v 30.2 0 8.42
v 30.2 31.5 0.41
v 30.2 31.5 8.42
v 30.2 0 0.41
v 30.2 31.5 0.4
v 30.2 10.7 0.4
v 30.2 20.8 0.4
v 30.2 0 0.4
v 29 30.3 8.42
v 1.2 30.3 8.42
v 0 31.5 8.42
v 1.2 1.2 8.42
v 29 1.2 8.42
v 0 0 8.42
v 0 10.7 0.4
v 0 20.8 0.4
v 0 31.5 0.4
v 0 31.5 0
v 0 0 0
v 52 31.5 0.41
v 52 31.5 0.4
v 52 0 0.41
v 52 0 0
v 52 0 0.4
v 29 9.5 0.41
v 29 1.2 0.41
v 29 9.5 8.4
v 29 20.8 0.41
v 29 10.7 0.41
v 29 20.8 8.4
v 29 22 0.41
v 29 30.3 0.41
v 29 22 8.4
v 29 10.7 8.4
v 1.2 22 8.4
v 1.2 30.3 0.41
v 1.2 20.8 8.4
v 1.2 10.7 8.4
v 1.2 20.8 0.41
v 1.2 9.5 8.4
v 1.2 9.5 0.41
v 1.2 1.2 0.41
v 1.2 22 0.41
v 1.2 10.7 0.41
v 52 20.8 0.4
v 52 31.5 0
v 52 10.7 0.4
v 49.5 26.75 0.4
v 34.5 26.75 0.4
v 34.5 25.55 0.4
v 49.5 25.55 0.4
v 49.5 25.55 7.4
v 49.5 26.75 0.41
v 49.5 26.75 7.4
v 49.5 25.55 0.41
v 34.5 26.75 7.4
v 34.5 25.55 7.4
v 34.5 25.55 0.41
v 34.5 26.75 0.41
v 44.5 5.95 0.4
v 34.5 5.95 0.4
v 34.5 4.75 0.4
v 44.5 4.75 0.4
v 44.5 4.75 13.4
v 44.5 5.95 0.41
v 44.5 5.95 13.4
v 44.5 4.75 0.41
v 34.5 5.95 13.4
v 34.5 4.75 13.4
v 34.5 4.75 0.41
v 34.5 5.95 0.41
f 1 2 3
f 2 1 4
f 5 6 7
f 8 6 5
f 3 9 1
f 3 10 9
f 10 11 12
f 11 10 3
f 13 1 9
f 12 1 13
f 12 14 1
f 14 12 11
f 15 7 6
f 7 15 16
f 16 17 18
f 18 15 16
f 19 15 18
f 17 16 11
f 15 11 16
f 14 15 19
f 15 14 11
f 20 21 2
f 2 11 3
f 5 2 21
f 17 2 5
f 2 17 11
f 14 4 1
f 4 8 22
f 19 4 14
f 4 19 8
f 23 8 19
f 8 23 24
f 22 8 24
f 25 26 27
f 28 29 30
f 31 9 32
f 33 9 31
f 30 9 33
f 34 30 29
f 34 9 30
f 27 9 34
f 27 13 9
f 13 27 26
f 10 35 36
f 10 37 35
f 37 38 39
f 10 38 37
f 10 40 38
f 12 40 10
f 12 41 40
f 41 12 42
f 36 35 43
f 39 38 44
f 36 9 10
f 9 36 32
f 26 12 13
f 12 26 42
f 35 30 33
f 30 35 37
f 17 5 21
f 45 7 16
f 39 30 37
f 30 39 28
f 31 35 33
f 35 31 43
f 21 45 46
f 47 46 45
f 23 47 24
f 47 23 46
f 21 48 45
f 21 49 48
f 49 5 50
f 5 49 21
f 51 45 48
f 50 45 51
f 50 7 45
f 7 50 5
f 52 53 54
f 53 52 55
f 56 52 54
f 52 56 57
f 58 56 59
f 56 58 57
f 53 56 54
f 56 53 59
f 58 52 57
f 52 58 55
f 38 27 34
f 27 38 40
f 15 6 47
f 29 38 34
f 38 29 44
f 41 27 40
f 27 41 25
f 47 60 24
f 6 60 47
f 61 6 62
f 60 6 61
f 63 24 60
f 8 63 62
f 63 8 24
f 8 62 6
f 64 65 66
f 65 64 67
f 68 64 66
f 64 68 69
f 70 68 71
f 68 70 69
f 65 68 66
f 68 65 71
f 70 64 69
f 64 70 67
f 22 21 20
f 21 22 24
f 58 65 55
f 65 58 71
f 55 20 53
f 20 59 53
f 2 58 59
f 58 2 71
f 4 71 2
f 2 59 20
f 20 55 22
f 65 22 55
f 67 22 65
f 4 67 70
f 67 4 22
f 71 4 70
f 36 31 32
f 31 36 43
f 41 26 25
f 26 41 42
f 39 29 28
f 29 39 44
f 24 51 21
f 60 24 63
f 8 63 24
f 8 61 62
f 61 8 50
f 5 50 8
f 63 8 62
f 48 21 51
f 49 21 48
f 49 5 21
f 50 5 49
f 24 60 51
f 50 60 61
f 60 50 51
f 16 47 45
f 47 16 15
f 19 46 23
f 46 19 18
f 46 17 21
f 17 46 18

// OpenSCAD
// file: ../../Base/Boxes.scad
// Fischertechnik Box Foundation
// Pre-designed Boxes

use <Constants.scad>

include <PlacementOptions.scad>

box190Width = 190;
box190Depth = 130;
box130Width = 130;
box130Depth = 95;
boxUsageHeight = 33.9;
boxWallThickness = 2.4;
boxBaseThickness = 1.0;
boxWebWidth = 3.0;

// getBoxWallThickness()
// Gets the wall thickness of a Fischertechnik Box

function getBoxWallThickness() = boxWallThickness;

// Gets the usable height of a fischertechnik box
function getBoxUsageHeight() = boxUsageHeight;

// Gets the thickness of the Fischertechnik box base.
function getBoxBaseThickness() = boxBaseThickness;

// Gets the width of a box web
function getBoxWebWidth() = boxWebWidth;

// Gets the usable inner space of a Box 190 as an x/y-list
function getBox190Space() = [
    box190Width - 2*getBoxWallThickness(), 
    box190Depth - 2*getBoxWallThickness() ];

// Imports the Fischertechnik empty box 130x190 mm and places it at position 0,0
// 190x130 are the outer sizes, the inner space is slightly smaller. Use getBox190Space() to get the inner sizes.
// This module needs the STL file "Fischertechnik Box 130x190.stl" in the library path.
// The box is positioned that the usable inner space is at the 0,0,0 position. The

module Box190() {
    translate([-getBoxWallThickness(),-getBoxWallThickness(),-getBoxBaseThickness()])
        import("Fischertechnik Box 130x190.stl", convexity=3);
}

// Gets the usable inner space of a Box 130 as an x/y-list
function getBox130Space() = [
    box130Width - 2*getBoxWallThickness(), 
    box130Depth - 2*getBoxWallThickness() ];

// Imports the Fischertechnik empty box 95x130 mm and places it at position 0,0
// 190x130 are the outer sizes, the inner space is slightly smaller. Use getBox190Space() to get the inner sizes.
// This module needs the STL file "Fischertechnik Box 95x130.stl" in the library path.
// The box is positioned that the usable inner space is at the 0,0,0 position. The

module Box130() {
    translate([-getBoxWallThickness(),-getBoxWallThickness(),-getBoxBaseThickness()])
        import("Fischertechnik Box 95x130.stl", convexity=3);
}

// Creates a web at the specified box walls
// corner 0 = LowerLeft, 1 = UpperLeft, 2 = UpperRight, 3 = LowerRight
// side 0 = LeftOfCorner, 1 = RightOfCorner
// distance = Distance in mm from the corner
// box = inner width and depth of the box (default: Box 190)
// webWidth = length of the web (default is 3 mms)
// webThickness = thickness of the web (default is 1 mm)

module BoxWeb(corner, side, distance, box=getBox190Space(), webWidth=getBoxWebWidth(), webThickness=1.0) {
    sink = getBoxWallThickness()/2;

    width = (corner % 2 == 0) ? 
            (side == LeftOfCorner ? webWidth : webThickness) :
            (side == LeftOfCorner ? webThickness : webWidth);

    depth = (corner % 2 == 0) ? 
            (side == RightOfCorner ? webWidth : webThickness) :
            (side == RightOfCorner ? webThickness : webWidth);
    
    xDiff = corner == LowerLeft ? 
                (side == LeftOfCorner ? -sink : distance) :
            (corner == UpperLeft ?                
                (side == LeftOfCorner ? distance : -sink) :
            (corner == UpperRight ?
                (side == LeftOfCorner ? box.x-webWidth+sink : box.x-distance-webThickness) :
                (side == LeftOfCorner ? box.x-distance-webThickness: box.x-webWidth+sink)));

    yDiff = corner == LowerLeft ? 
                (side == RightOfCorner ? -sink : distance) :
            (corner == UpperLeft ?
                (side == RightOfCorner ? box.y-distance : box.y-webWidth+sink) :
            (corner == UpperRight ?
                (side == RightOfCorner ? box.y-webWidth+sink : box.y-distance) :
                (side == RightOfCorner ? distance : -sink)));
    
    translate([xDiff, yDiff, -getExcess()])
        cube([width, depth, boxUsageHeight + 2*getExcess()]);
}
// file: ../../Base/Alignment.scad
// Fischertechnik Box Foundation
// Geometry Helpers Alignment

include <PlacementOptions.scad>

// getAlignedX(elementWidth, spaceWidth, align=AlignRight, offset=0)
// Gets the aligned X offset of an element with the given
// width in the given space.
// elementWidth = The width of the element to positon
// spaceWidth = The space where the element should be aligned
// align = 0 AlignLeft, 1 AlignCenter, 2 AlignRight
// offset = an optional offset from the aligned position. When
// aligned left or centered, then positive values are in X direction.
// When aligned right then positive values are in negative X direction.

function getAlignedX(elementWidth, spaceWidth, align=AlignRight, offset=0) =
    (align == AlignLeft) ?
        offset :
        ((align == AlignCenter) ?
        (spaceWidth - elementWidth)/2 + offset :
        spaceWidth - offset - elementWidth);

// getAlignedY(elementDepth, spaceDepth, align=AlignTop, offset=0)
// Gets the aligned Y offset of an element with the given
// depth in the given space.
// elementDepth = The depth of the element to positon
// spaceDepth = The space where the element should be aligned
// align = 0 AlignBottom, 1 AlignCenter, 2 AlignTop
// offset = an optional offset from the aligned position. When
// aligned bottom or centered, then positive values are in Y direction.
// When aligned top then positive values are in negative Y direction.

function getAlignedY(elementDepth, spaceDepth, align=AlignTop, offset=0) =
    (align == AlignBottom) ?
        offset :
        ((align == AlignCenter) ?
        (spaceDepth - elementDepth)/2 + offset :
        spaceDepth - offset - elementDepth);
// file: ../../Base/Rotation.scad
// Fischertechnik Box Foundation
// Geometry Helpers Rotation

include <PlacementOptions.scad>

// getRotatedSpace(space, rotation=NoRotation)
// Rotates the space dependent on the specified rotation

function getRotatedSpace(space, rotation=NoRotation) = [
    (rotation == Rotate90 || rotation == Rotate270) ? space.y : space.x,
    (rotation == Rotate90 || rotation == Rotate270) ? space.x : space.y
];

// Rotates the given space around the fixed left lower corner
// space = the space the children needs as width/depth list [width,depth]
// rotation = 0 Rotate0 degrees, 1 Rotate90 degrees, 2 Rotate180 degrees, 3 Rotate270 degrees (equivalent to -90)

module RotateFix(space, rotation=Rotate0) {
    dy = (rotation == Rotate0 || rotation == Rotate270) ? 0 :
        (rotation == Rotate90) ? space.x :
        space.y;
    dx = (rotation < Rotate180) ? 0 :
        (rotation == Rotate180) ? space.x :
        space.y;
    
    translate([dx, dy, 0])
        rotate([0, 0, rotations[rotation]])
            children();
}
// file: ../../Base/Placement.scad
// Fischertechnik Box Foundation
// Geometry Helpers Placement

use <Constants.scad>
use <Alignment.scad>
use <Rotation.scad>
use <Boxes.scad>

include <PlacementOptions.scad>

// Place(x=0, y=0, elementSpace=[0,0], alignX=AlignLeft, alignY=AlignBottom, rotation=Rotate0, boxSpace=getBox190Space())
// Places the child at the specified position
// y = Y-Position. This is a relative position when an X aligment is specified.
// x = X-Position. This is a relative position when an Y aligment is specified.
// elementSpace = space of the element to be placed [x,y]
// alignX = -1=NoAlign, 0 AlignLeft, 1 AlignCenter, 3 AlignRight (elementSpace and boxSpace required!)
// alignY = -1=NoAlign, 2 AlignBottom, 1 AlignCenter, 4 AlignTop (elementSpace and boxSpace required!)
// rotation = 0 Rotate0 0 degrees, 1 Rotate90 90 degrees, 
// 2 Rotate180 180 degrees, 3 Rotate270 270 degrees (equivalent to -90)
// boxSpace = Inner space of the box where the placement occurs [x,y] - default is Box 190x130 inner space

module Place(x=0, y=0, elementSpace=[0,0], 
  alignX=AlignLeft, alignY=AlignBottom, 
  rotation=NoRotation, boxSpace=getBox190Space()) {

    module Position(x, y, space, rotation=Rotate0) {
        translate([x, y, 0])
            RotateFix(space, rotation)
                children();
    }

    space = getRotatedSpace(elementSpace, rotation);
    alignedX = getAlignedX(space.x, boxSpace.x, alignX, x);
    alignedY = getAlignedY(space.y, boxSpace.y, alignY, y);
    Position(alignedX, alignedY, elementSpace, rotation)
        children();
}

// Center(space=getBox130Space(), elementSpace=[0,0])
// space = Space where the children is centered. For cylinder use centered=true and no elementSpace.
// elementSpace = space of the element to be centered [x,y]

module Center(space=getBox190Space(), elementSpace=[0,0]) {
    translate([(space.x - elementSpace.x) / 2, (space.y - elementSpace.y) / 2])
        children(0);
}

// CenterHorizontal(width=0, y=0, offset=0, space=getBox130Space())
// space = Space where the children is centered. For cylinder use centered=true and no elementSpace.
// elementSpace = space of the element to be centered [x,y]

module CenterHorizontal(width=0, y=0, offset=0, space=getBox190Space()) {
    translate([(space.x - width) / 2 + offset, y])
        children(0);
}

// CenterVertical(depth=0, x=0, offset=0, space=getBox130Space())
// space = Space where the children is centered. For cylinder use centered=true and no elementSpace.
// elementSpace = space of the element to be centered [x,y]

module CenterVertical(depth=0, x=0, offset=0, space=getBox190Space()) {
    translate([x, (space.y - depth) / 2 + offset])
        children(0);
}
// file: ../../Base/PlacementOptions.scad
// Fischertechnik Box Foundation
// Placement Options

// Alignment
NoAlign = 0;
AlignLeft = 1;
AlignBottom = 2;
AlignCenter = 3;
AlignRight = 4;
AlignTop = 5;

// Element rotation degree steps
rotations = [0, -90, -180, -270];

// Rotation
NoRotation = 0;
Rotate0 = 0;
Rotate90 = 1;
Rotate180 = 2;
Rotate270 = 3;

// Docking (seen from above)
NoDock = -1;
DockLeft = 0;
DockTop = 1;
DockRight = 2;
DockCorner = 2;
DockBottom = 3;

// Web corners
LowerLeft = 0;
UpperLeft = 1;
UpperRight = 2;
LowerRight = 3;

// Web position relative to corner
LeftOfCorner = 0;
RightOfCorner = 1;
// file: ../../Elements/FrameBracketWithoutWorm.scad
// Fischertechnik Box Library
// Frame  for bracket without worm
// 31046

use <../Base/Constants.scad>
use <../ModelBase/Complex.scad>

// getFrameBracketWithoutWormSpace()
// Gets the space for a frame for a bracket with worm.

function getFrameBracketWithoutWormSpace() = getFrameBracketSpace();

// FrameBracketWithoutWorm()
// Frame for bracket with worm.

module FrameBracketWithoutWorm() {
    FrameBracket([ 10, getDividerThickness(), 13 ]);
}

// Test
color("lightgray")
FrameBracketWithoutWorm();
// file: ../../Elements/FrameBracketWithWorm.scad
// Fischertechnik Box Library
// Frame  for bracket with worm
// 31045

use <../Base/Constants.scad>
use <../ModelBase/Complex.scad>

// getFrameBracketWithWormSpace()
// Gets the space for a frame for a bracket with worm.

function getFrameBracketWithWormSpace() = getFrameBracketSpace();

// FrameBracketWithWorm()
// Frame for bracket with worm.

module FrameBracketWithWorm() {
    FrameBracket([ 15, getDividerThickness(), 7 ]);
}

// Test
color("lightgray")
FrameBracketWithWorm();
// file: ../../Base/Deployment.scad
// Fischertechnik Box Foundation
// Geometry Helpers Deployment

use <Constants.scad>
use <Placement.scad>
use <Rotation.scad>

include <PlacementOptions.scad>

// getWidth(spaces, rotations, count, i=0)
// Gets the sum of the width of count specified spaces, including rotations for each space.
// spaces = List of spaces from which the width should be added. Used internally for DeployRow.
// rotations = specify rotations for each space to get its correct width
// count = The count of spaces from the specified spaces that should be included in the sum (for recursive call)
// i = The space index offset used to start to add (for recursive call)

function getWidth(spaces, rotations, count, i=0) = 
    (i < count) ? 
        getRotatedSpace(spaces[i], rotations[i]).x + getWidth(spaces, rotations, count, i+1) : 
        0;

// getX(spaces, rotations, distance, i)
// Calculates the X position of the space with the index i, when the spaces are placed with the given
// equal distances. Used internally for DeployHorizontal.
// spaces = List of spaces from which the width should be added
// rotations = specify rotations for each space to get its correct width
// distance = Equal distance between each space
// i = Index of the space to get its X position for

function getX(spaces, rotations, distance, i) = 
    (i == 0) ? 
        0 :
        (getRotatedSpace(spaces[i-1], rotations[i-1]).x + distance + getX(spaces, rotations, distance, i-1));

// DeployHorizontal(width, spaces, rotations)
// Deploys the elements in the specified width with equal distances.
// rowWidth = The width of the row in mm.
// spaces = The spaces of all elements to deploy.
// rotations = The rotations of each element: 0 Rotate0 0 degrees, 1 Rotate90 90 degrees, 
// 2 Rotate180 180 degrees, 3 Rotate270 270 degrees (equivalent to -90).

module DeployHorizontal(rowWidth, spaces, rotations) {
    distance = (rowWidth - getWidth(spaces, rotations, len(spaces))) / (len(spaces)-1);
    
    for (i = [0:1:$children-1]) {
        x = getX(spaces, rotations, distance, i);
        translate([x, 0])
            RotateFix(spaces[i], rotations[i])
                children(i);
    }
}

// getDepth(spaces)
// Gets the sum of the depth of count specified spaces.
// spaces = List of spaces from which the width should be added. Used internally for DeployRow.
// rotations = specify rotations for each space to get its correct width
// count = The count of spaces from the specified spaces that should be included in the sum
// i = The space index offset used to start to add

function getDepthSum(spaces, i=0) = 
    (i < len(spaces)) ? 
        spaces[i].y + getDepthSum(spaces, i+1) : 
        0;

// getY(spaces, distance, i)
// Gets the Y-distance the spaces plus constant distance 
// between each space needs.
// spaces = Spaces of each element to deploy vertically. Only
// the depth (y) is used.
// distance = distance between each space when deployed.
// i = The highest index of the spaces used

function getY(spaces, distance, i) = 
    (i == 0) ? 
        0 :
        spaces[i].y + distance + getY(spaces, distance, i-1);

// DeployVertical(depth, spaces)
// Deploys the child elements in the specified depth vertically.
// depth = Depth of the space where the elements should be deployed.
// spaces = Spaces of all elements. Only the depth (y) will be used.

module DeployVertical(depth, spaces) {
    distance = (depth - getDepthSum(spaces)) / (len(spaces)-1);
    count = $children - 1;
    
    for (i = [0:1:$children-1]) {
        y = getY(spaces, distance, count-i);
        translate([0, y, -getExcess()])
            children(i);
    }
}

// DeploySame(space, elementSpace, columns=2, rows=1, rotation=Rotate0)
// Deploys columns and rows of the specified child in the specified space with
// equal distances
// space = The space where the element copies are deployed
// elementSpace = The space the child needs
// columns = Count of elements per row
// rows = Count of rows deployed
// rotation = The rotation of the child that will be applied

module DeploySame(space, elementSpace, columns=2, rows=1, rotation=Rotate0) {
    
    elementWidth = getRotatedSpace(elementSpace, rotation).x;
    columnDistance = (space.x - columns * elementWidth) / (columns > 1 ? columns - 1 : 1);
    endColumnOffset = space.x - elementWidth;
    columnOffsetStep = elementWidth + columnDistance;
    
    elementDepth = getRotatedSpace(elementSpace, rotation).y;
    rowDistance = (space.y - rows * elementDepth) / (rows > 1 ? rows - 1 : 1);
    endRowOffset = space.y - elementDepth;
    rowOffsetStep = elementDepth + rowDistance;
    
    for (rowOffset = [0:rowOffsetStep:endRowOffset]) {
        for (columnOffset = [0:columnOffsetStep:endColumnOffset]) {
            translate([columnOffset, rowOffset])
                RotateFix(elementSpace, rotation)
                    children(0);
        }
    }
}

// getMergedRowWidth(spaces, rotations, count, i=0)
// Gets the width of the merged spaces with the specified rotations.
// Merging works all elements with two frame walls. 
// The right and left walls are merged into one single wall.
// spaces = List of spaces from which the width should be added.
// rotations = specify rotations for each space to get its correct width
// count = The count of spaces from the specified spaces that should be included in the sum (for recursive call)
// i = The space index offset used to start to add (for recursive call)

function getMergedRowWidth(spaces, rotations, count, i=0) =
    (i < count) ? 
        getRotatedSpace(spaces[i], rotations[i]).x + getWidth(spaces, rotations, count, i+1) - (i > 0 ? getDividerThickness() : 0) : 
        0;

// MergeRow(spaces, rotations, dividerThickness=0.8)
// Deploys the children so that all walls of the neighbors are merged in a single common wall.
// spaces = List of spaces of the children to get the sizes from.
// rotations = specify rotations for each space to get its correct width
// dividerThickness = Thickness of all dividers of the elements (default is 0.8)

module MergeRow(spaces, rotations, dividerThickness = getDividerThickness()) {
    for (i = [0:1:$children-1]) {
        x = getX(spaces, rotations, -getDividerThickness(), i);
        translate([x, 0, 0])
            RotateFix(spaces[i], rotations[i])
                children(i);
    }
}

// Merge(count, space, rotation, dividerThickness=0.8)
// Deploys the child count times so that all walls of the neighbors are merged in a single common wall.
// space = Space of the child to get the sizes from.
// rotation = rotation of the child to get the correct width
// dividerThickness = Thickness of all dividers of the element (default is 0.8)

module Merge(count, space, rotation, dividerThickness = getDividerThickness()) {
    x = getRotatedSpace(space, rotation).x - getDividerThickness();
    for (offset = [0:x:(count-1)*x]) {
        echo(offset);
        translate([offset, 0, 0])
            RotateFix(space, rotation)
                children(0);
    }
}
// file: ../../Elements/AxisClip10.scad
// Fischertechnik Box Library
// Axis for clip 10
// 31023

use <../ModelBase/Simple.scad>

width = 12;
depth = 12;
height = 23;

// getAxisClip10Space()
// Gets the space of a frame for a clip 10 with spring ring (mot2)

function getAxisClip10Space() = [width, depth, height];

// AxisClip10()
// Axis for clip 10 with spring ring (mot2)

module AxisClip10() {
    LeveledAxisWithSpace(height, height-10, getAxisClip10Space());
}

// Tests
color("lightgray")
AxisClip10();
// file: ../../Base/Constants.scad
// Fischertechnik Box Foundation
// Constants

// Constant values necessary for multiple elements

// Base constants
dividerThickness = 1.2;
excess = 0.01;
fragments = 90;
tolerance = 0.8;

// Gets the thickness of a divider 
function getDividerThickness() = dividerThickness;

// Gets the excess that is used to merge walls into each other
function getExcess() = excess;

// Gets amount of fragments of a cylinder
function getFragments() = fragments;

// Gets the inner tolerance of a frame to each side
function getTolerance() = tolerance;


// Fischertechnik specific constants
axisDiameter = 4;
axisBottomDiameter = axisDiameter + 1;
standardEdgeDistance = 2.5;
standardWebDistance = 11.5;
standardCornerLength = 15;
tubeWallFactor = 0.8;

// Gets axis diameter
function getAxisDiameter() = axisDiameter;

// Gets axis bottom diameter for thicker part at the bottom
function getAxisBottomDiameter() = axisBottomDiameter;

// gets the standard distance to the wall of the box for dockable frames with webs
function getStandardEdgeDistance() = standardEdgeDistance;

// gets the standard distance of each web to the corner of the dockable frame
function getStandardWebDistance() = standardWebDistance;

// gets the standard length of the corner walls of a dockable frame
function getStandardCornerLength() = standardCornerLength;

// gets the wall thickness of a tube.
function getTubeWallThickness() = tubeWallFactor * getDividerThickness();
// file: ../../Elements/FrameBracketCombo.scad
// Fischertechnik Box Library
// Frames for brackets with and without worm
// 31045 + 31046

use <../Base/Constants.scad>
use <../Base/Deployment.scad>
use <../ModelBase/Simple.scad>
use <../ModelBase/Complex.scad>
use <FrameBracketWithWorm.scad>
use <FrameBracketWithoutWorm.scad>

include <../Base/PlacementOptions.scad>

outerDepth = 31.5;

// getFrameBracketComboSpace()
// Gets the space for a frame for a combination of brackets with worm and without worm.

function getFrameBracketComboSpace() = [getFrameBracketSpace().x, outerDepth];

// FrameBracketCombo()
// Frame for a combination of brackets with worm and without worm.

module FrameBracketCombo() {
    Space(getFrameBracketComboSpace());
    Frame([getFrameBracketWidth(), outerDepth - 2*getDividerThickness() - getTolerance(), getFrameBracketSpace().z]);
    DeployVertical(outerDepth, [getFrameBracketWithWormSpace(), getFrameBracketWithoutWormSpace()]) {
        FrameBracketWithWorm();
        FrameBracketWithoutWorm();
    }
}

// Test
color("lightgray")
FrameBracketCombo();
// file: ../TestPrint.scad
// 3D Print Test Base

use <../Base/Constants.scad>

use <../Elements/AxisClip10.scad>

module TestPrint(elementSpace) {
    cube([elementSpace.x, elementSpace.y, 0.4]);
    translate([0,0,0.4+getExcess()]) {
        children();
    }
}

TestPrint(getAxisClip10Space())
    AxisClip10();
// main file
// 3D Print Test Base
// FrameBracketCombo

use <../TestPrint.scad>
use <../../Elements/FrameBracketCombo.scad>

TestPrint(getFrameBracketComboSpace())
    FrameBracketCombo();
